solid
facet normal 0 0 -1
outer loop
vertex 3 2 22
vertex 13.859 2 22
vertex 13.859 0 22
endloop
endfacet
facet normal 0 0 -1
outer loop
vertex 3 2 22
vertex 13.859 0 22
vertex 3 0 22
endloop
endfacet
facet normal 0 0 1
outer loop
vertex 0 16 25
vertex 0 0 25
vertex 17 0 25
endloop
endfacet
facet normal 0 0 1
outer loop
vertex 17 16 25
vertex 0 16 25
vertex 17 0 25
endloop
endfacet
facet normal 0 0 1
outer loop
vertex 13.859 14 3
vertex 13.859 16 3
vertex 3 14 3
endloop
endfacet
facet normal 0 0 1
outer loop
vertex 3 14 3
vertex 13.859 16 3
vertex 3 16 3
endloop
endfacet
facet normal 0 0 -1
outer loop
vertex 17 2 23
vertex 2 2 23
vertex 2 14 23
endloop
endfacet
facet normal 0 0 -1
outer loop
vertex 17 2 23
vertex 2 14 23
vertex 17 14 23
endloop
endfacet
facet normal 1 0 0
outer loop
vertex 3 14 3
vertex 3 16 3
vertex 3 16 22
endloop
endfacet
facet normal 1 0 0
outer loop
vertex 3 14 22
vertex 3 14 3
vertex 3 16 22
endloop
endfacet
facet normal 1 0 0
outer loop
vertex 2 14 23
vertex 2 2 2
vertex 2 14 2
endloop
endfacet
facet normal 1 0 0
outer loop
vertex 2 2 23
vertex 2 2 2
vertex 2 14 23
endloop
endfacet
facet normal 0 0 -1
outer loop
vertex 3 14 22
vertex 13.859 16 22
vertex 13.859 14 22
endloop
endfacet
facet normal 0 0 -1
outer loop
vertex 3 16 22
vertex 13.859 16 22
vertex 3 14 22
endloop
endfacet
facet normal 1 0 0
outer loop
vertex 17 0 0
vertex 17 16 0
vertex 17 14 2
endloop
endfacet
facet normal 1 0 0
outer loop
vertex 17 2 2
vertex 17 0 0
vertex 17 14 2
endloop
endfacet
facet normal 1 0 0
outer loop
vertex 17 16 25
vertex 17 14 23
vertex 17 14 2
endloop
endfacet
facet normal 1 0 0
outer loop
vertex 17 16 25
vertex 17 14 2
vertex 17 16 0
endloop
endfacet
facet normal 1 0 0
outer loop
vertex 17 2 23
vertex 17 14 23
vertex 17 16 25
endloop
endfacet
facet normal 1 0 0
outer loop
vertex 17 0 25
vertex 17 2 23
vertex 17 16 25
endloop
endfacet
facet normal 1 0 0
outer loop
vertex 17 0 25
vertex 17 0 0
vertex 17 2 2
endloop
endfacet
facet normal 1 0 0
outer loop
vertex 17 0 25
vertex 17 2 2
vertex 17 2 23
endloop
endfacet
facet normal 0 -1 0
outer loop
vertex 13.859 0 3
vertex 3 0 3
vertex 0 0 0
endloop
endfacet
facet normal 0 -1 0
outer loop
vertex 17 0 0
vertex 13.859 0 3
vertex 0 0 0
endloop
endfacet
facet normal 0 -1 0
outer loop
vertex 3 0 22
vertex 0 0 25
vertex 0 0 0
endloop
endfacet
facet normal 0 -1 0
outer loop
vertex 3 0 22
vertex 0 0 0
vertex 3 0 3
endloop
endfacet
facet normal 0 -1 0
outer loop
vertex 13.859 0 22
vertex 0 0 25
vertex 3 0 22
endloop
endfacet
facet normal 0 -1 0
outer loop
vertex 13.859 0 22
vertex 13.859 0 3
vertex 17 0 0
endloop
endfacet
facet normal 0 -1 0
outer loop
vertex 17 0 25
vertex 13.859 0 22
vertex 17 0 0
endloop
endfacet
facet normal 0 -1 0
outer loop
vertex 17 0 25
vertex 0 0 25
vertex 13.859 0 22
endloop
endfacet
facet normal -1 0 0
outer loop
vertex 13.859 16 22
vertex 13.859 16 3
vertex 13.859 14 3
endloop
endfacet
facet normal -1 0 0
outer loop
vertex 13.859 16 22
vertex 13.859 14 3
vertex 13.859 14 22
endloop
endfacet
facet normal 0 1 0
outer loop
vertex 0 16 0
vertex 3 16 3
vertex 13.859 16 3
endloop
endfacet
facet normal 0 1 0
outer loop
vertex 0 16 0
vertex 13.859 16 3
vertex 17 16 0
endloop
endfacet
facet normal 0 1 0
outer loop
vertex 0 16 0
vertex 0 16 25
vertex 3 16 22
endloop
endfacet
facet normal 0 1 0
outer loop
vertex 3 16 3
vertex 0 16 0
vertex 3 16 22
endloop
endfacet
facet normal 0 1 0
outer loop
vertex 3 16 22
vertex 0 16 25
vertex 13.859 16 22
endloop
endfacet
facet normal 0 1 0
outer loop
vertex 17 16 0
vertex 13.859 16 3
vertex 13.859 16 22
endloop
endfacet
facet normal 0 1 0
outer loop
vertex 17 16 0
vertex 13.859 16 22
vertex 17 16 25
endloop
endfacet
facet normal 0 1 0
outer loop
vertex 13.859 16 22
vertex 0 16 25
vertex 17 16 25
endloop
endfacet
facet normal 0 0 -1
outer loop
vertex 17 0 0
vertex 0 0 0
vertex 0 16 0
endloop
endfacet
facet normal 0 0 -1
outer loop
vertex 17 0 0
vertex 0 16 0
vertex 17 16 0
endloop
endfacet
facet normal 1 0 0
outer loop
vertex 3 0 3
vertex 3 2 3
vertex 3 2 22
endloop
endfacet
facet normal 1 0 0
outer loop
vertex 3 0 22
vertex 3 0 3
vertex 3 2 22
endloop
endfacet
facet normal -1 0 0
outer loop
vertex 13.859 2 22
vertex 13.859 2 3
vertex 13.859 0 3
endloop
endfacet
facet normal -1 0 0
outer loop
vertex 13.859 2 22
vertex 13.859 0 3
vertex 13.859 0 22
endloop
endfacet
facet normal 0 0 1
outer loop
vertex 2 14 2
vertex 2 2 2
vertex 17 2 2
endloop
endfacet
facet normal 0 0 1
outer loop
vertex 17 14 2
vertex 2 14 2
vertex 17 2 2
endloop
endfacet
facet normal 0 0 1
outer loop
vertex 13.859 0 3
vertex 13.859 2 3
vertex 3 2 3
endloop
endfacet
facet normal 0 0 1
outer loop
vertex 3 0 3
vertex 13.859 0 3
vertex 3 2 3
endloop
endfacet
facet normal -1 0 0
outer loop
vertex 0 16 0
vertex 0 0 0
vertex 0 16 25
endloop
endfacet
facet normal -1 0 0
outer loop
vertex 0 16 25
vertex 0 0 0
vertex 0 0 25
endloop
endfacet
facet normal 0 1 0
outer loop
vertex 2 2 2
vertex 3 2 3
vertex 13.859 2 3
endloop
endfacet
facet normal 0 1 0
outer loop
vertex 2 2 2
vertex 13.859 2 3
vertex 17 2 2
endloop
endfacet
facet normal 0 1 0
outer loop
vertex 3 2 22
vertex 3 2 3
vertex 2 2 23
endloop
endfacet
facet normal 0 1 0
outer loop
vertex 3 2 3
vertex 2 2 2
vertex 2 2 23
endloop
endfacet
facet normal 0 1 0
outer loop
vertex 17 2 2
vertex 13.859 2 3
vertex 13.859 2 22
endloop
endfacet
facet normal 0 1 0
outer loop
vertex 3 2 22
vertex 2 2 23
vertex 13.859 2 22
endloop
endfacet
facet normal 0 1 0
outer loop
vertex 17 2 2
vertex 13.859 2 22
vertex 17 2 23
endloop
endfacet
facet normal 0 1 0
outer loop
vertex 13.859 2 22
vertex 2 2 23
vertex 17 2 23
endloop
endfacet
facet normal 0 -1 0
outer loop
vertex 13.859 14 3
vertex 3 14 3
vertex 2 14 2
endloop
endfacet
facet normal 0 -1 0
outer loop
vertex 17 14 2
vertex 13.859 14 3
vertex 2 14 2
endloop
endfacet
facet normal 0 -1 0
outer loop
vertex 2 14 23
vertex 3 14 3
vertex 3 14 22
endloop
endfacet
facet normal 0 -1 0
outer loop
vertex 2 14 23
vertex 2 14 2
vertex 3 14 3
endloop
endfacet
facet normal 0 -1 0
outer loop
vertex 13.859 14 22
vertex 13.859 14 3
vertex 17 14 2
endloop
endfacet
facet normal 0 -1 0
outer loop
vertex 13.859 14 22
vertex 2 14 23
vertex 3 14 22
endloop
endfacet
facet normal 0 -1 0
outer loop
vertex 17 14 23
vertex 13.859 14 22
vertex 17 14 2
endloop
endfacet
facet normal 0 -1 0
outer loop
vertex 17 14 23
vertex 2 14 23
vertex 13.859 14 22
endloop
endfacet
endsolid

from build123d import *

# Parameters (mm, degrees)
F0_W     = 17
F0_H     = 25
F1_DEPTH = 16
F2_T     = -2
F3_W     = 10.859362
F3_H     = 19
F4_DEPTH = 16.001


with BuildPart() as f1:
    # F0 (on Front) → F1 (new body)
    with BuildSketch(Plane.XZ):
        with Locations((8.5, 12.5)):
            Rectangle(F0_W, F0_H)
    extrude(amount=-F1_DEPTH)

    # F2
    f2_openings = [f1.faces().sort_by_distance(p)[0] for p in [
        (17, 8, 12.5),
    ]]
    offset(amount=F2_T, openings=f2_openings)

    # F3 (on face) → F4 (cut, through all)
    with BuildSketch(Plane(origin=(0, 16, 0), x_dir=(-1, 0, 0), z_dir=(0, 1, 0))):
        with Locations((-8.429681, 12.5)):
            Rectangle(F3_W, F3_H)
    extrude(amount=-F4_DEPTH, mode=Mode.SUBTRACT)


solid = f1.part
